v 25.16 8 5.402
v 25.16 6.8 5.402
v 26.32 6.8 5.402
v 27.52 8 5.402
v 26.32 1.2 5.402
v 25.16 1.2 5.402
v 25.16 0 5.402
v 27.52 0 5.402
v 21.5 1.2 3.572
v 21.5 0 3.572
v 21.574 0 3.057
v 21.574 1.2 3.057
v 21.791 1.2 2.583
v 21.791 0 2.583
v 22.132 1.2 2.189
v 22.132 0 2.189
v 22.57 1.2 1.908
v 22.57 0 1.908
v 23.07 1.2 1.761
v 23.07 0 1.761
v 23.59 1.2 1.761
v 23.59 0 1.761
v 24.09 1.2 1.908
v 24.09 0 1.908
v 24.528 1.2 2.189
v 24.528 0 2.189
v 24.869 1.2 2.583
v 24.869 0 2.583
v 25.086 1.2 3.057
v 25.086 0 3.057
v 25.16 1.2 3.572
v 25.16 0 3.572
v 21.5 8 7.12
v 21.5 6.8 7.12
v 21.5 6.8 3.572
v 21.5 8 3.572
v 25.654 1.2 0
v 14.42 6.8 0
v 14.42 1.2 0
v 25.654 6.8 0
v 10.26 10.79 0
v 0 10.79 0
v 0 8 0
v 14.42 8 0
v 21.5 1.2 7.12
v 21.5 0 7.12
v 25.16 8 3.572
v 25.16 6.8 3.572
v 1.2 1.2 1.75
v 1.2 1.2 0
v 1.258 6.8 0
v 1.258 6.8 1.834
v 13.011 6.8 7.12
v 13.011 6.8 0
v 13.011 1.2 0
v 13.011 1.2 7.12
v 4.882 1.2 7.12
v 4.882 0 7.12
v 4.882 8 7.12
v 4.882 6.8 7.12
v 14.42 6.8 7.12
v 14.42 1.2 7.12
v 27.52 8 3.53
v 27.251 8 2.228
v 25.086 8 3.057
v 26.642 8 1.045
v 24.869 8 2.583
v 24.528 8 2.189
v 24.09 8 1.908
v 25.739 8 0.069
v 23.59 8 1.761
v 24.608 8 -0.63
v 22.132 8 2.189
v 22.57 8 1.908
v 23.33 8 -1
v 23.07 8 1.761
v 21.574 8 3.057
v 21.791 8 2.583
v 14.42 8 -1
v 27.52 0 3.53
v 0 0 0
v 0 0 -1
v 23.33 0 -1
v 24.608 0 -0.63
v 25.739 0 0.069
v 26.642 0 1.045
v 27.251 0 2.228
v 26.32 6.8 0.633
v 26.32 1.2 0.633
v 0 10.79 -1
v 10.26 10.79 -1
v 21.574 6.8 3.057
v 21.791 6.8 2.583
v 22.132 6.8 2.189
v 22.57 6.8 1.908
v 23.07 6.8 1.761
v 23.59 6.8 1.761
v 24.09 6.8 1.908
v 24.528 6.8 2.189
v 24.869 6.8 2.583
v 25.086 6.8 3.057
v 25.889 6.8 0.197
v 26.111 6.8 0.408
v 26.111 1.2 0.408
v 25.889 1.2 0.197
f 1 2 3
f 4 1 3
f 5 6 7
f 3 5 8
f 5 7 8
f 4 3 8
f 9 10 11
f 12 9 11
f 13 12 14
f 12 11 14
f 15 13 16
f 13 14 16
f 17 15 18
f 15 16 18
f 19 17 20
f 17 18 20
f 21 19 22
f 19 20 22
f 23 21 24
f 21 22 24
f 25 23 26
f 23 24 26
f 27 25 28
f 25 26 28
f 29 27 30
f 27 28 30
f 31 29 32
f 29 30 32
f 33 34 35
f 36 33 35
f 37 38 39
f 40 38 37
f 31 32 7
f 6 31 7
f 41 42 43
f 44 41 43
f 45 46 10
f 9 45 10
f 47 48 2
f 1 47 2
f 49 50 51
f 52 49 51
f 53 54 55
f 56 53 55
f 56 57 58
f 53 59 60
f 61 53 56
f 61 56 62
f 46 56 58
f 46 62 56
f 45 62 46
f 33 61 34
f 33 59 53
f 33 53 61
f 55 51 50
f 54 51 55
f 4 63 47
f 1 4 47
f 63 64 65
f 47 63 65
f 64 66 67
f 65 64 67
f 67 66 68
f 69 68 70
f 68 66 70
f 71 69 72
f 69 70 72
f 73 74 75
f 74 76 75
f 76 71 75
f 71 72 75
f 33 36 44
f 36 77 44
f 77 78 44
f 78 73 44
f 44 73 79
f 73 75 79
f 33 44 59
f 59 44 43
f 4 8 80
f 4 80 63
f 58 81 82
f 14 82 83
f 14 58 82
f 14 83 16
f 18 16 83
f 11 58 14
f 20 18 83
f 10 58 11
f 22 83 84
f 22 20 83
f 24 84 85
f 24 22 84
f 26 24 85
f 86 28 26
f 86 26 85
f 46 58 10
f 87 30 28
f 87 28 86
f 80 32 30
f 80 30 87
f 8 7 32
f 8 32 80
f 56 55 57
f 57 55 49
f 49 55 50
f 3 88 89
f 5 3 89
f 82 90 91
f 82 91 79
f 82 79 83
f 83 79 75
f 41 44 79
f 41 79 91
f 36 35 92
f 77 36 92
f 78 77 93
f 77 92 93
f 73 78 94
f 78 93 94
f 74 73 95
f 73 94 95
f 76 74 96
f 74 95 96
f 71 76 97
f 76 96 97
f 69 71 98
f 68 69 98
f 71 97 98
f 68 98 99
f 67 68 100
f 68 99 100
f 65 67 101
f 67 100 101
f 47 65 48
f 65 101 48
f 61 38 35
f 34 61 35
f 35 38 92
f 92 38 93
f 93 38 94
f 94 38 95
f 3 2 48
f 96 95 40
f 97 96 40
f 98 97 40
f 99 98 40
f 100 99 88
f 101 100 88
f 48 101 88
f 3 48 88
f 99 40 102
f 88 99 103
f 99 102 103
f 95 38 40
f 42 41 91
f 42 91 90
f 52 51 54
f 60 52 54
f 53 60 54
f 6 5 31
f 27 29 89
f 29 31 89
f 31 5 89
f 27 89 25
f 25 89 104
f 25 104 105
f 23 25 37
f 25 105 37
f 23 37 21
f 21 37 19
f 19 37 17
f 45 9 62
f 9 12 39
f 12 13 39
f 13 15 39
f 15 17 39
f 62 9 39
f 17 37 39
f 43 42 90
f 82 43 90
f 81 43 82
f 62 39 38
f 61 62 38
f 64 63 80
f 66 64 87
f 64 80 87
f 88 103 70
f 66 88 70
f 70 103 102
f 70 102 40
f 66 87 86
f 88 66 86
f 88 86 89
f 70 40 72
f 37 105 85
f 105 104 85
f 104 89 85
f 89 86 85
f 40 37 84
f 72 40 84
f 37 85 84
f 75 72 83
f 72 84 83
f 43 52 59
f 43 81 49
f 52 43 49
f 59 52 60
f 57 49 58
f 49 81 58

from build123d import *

# Parameters (mm, degrees)
F1_DEPTH = 7.12
F2_DEPTH = 1
F3_W     = 2.36
F3_H     = 1.7178014041
F4_DEPTH = 10.791
F5_DEPTH = 25


with BuildPart() as f1:
    # F0 (on Top) → F1 (new body)
    with BuildSketch(Plane.XY):
        Polygon((0, 8), (0, 0), (10.26, 0), (14.42, 0), (22.52, 0), (27.52, 0), (27.52, 8), (22.52, 8), (14.42, 8), (1.2575370492, 8), align=None)
        Polygon((10.26, 1.2), (1.2, 1.2), (1.2575370492, 6.8), (13.0106639117, 6.8), (14.0548550674, 6.8), (14.42, 6.8), (22.52, 6.8), (26.32, 6.8), (26.32, 1.2), (22.52, 1.2), (14.42, 1.2), (13.0106639117, 1.2), align=None, mode=Mode.SUBTRACT)
        Polygon((14.0548550674, 6.8), (13.0106639117, 6.8), (13.0106639117, 1.2), (14.42, 1.2), (14.42, 6.8), align=None)
    extrude(amount=F1_DEPTH)

    # F0 (on Top) → F2 (join)
    with BuildSketch(Plane.XY):
        Polygon((0, 10.79), (0, 8), (1.2575370492, 8), (14.42, 8), (10.26, 10.79), align=None)
        Polygon((0, 8), (0, 0), (10.26, 0), (14.42, 0), (22.52, 0), (27.52, 0), (27.52, 8), (22.52, 8), (14.42, 8), (1.2575370492, 8), align=None)
        Polygon((10.26, 1.2), (1.2, 1.2), (1.2575370492, 6.8), (13.0106639117, 6.8), (14.0548550674, 6.8), (14.42, 6.8), (22.52, 6.8), (26.32, 6.8), (26.32, 1.2), (22.52, 1.2), (14.42, 1.2), (13.0106639117, 1.2), align=None, mode=Mode.SUBTRACT)
        Polygon((1.2575370492, 6.8), (1.2, 1.2), (10.26, 1.2), (13.0106639117, 1.2), (13.0106639117, 6.8), align=None)
        Polygon((14.0548550674, 6.8), (13.0106639117, 6.8), (13.0106639117, 1.2), (14.42, 1.2), (14.42, 6.8), align=None)
        Polygon((14.42, 6.8), (14.42, 1.2), (22.52, 1.2), (26.32, 1.2), (26.32, 6.8), (22.52, 6.8), align=None)
    extrude(amount=-F2_DEPTH)

    # F3 (on Front) → F4 (cut, through all)
    with BuildSketch(Plane.XZ):
        with BuildLine():
            ThreePointArc((21.5, 3.5721985959), (23.33, 1.7421985959), (25.16, 3.5721985959))
            ThreePointArc((25.16, 3.5721985959), (24.6240054096, 4.8662040054), (23.33, 5.4021985959))
            ThreePointArc((23.33, 5.4021985959), (22.0359945904, 4.8662040054), (21.5, 3.5721985959))
        make_face()
        with BuildLine():
            ThreePointArc((21.5, 3.5721985959), (22.0359945904, 4.8662040054), (23.33, 5.4021985959))
            Line((23.33, 5.4021985959), (25.16, 5.4021985959))
            Line((25.16, 5.4021985959), (25.16, 7.12))
            Line((25.16, 7.12), (21.5, 7.12))
            Line((21.5, 7.12), (21.5, 3.5721985959))
        make_face()
        with Locations((26.34, 6.2610992979)):
            Rectangle(F3_W, F3_H)
        with BuildLine():
            ThreePointArc((23.33, 5.4021985959), (24.6240054096, 4.8662040054), (25.16, 3.5721985959))
            Line((25.16, 3.5721985959), (25.16, 5.4021985959))
            Line((25.16, 5.4021985959), (23.33, 5.4021985959))
        make_face()
        with BuildLine():
            Line((27.52, -1), (27.52, 3.5302453605))
            ThreePointArc((27.52, 3.5302453605), (26.2239695669, 0.5261599489), (23.33, -1))
            Line((23.33, -1), (27.52, -1))
        make_face()
    extrude(amount=-F4_DEPTH, mode=Mode.SUBTRACT)

    # F3 (on Front) → F5 (cut)
    with BuildSketch(Plane.XZ):
        Polygon((0, 0), (4.881774541, 7.12), (0, 7.12), align=None)
    extrude(amount=-F5_DEPTH, mode=Mode.SUBTRACT)


solid = f1.part
